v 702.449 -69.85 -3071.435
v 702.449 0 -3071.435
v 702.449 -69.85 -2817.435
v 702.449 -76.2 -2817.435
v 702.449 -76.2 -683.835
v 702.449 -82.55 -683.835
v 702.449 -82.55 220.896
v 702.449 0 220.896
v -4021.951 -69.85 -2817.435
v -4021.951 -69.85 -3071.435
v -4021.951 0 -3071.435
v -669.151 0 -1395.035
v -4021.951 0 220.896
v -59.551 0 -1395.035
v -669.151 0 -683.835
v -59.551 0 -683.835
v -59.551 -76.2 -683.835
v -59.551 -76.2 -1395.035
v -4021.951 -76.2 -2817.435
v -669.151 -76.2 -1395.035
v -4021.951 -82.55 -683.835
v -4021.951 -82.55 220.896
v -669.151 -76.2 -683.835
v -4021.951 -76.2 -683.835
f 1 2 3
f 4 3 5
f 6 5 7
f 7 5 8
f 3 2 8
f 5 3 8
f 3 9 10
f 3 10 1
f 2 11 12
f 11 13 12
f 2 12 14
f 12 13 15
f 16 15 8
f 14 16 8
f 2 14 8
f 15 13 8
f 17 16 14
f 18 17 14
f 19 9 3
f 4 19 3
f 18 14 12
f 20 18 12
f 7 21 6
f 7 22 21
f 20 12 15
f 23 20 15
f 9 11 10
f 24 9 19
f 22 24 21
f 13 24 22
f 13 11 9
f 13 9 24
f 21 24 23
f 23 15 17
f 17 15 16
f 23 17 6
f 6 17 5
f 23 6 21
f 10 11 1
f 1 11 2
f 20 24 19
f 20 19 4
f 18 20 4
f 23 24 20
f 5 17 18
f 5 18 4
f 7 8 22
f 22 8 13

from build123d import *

# Parameters (mm, degrees)
F1_DEPTH = 82.55
F2_DEPTH = 76.2
F0_W     = 4724.4
F0_H     = 254
F3_DEPTH = 69.85


with BuildPart() as f1:
    # F0 (on Front) → F1 (new body)
    with BuildSketch(Plane.XZ):
        Polygon((-4021.951199, -683.835213), (-669.151199, -683.835213), (-59.551199, -683.835213), (702.448801, -683.835213), (702.448801, 220.895961), (-4021.951199, 220.895961), align=None)
    extrude(amount=F1_DEPTH)

    # F0 (on Front) → F2 (join)
    with BuildSketch(Plane.XZ):
        Polygon((-669.151199, -1395.035213), (-669.151199, -683.835213), (-4021.951199, -683.835213), (-4021.951199, -2817.435213), (702.448801, -2817.435213), (702.448801, -683.835213), (-59.551199, -683.835213), (-59.551199, -1395.035213), align=None)
    extrude(amount=F2_DEPTH)

    # F0 (on Front) → F3 (join)
    with BuildSketch(Plane.XZ):
        with Locations((-1659.751199, -2944.435213)):
            Rectangle(F0_W, F0_H)
    extrude(amount=F3_DEPTH)


solid = f1.part
